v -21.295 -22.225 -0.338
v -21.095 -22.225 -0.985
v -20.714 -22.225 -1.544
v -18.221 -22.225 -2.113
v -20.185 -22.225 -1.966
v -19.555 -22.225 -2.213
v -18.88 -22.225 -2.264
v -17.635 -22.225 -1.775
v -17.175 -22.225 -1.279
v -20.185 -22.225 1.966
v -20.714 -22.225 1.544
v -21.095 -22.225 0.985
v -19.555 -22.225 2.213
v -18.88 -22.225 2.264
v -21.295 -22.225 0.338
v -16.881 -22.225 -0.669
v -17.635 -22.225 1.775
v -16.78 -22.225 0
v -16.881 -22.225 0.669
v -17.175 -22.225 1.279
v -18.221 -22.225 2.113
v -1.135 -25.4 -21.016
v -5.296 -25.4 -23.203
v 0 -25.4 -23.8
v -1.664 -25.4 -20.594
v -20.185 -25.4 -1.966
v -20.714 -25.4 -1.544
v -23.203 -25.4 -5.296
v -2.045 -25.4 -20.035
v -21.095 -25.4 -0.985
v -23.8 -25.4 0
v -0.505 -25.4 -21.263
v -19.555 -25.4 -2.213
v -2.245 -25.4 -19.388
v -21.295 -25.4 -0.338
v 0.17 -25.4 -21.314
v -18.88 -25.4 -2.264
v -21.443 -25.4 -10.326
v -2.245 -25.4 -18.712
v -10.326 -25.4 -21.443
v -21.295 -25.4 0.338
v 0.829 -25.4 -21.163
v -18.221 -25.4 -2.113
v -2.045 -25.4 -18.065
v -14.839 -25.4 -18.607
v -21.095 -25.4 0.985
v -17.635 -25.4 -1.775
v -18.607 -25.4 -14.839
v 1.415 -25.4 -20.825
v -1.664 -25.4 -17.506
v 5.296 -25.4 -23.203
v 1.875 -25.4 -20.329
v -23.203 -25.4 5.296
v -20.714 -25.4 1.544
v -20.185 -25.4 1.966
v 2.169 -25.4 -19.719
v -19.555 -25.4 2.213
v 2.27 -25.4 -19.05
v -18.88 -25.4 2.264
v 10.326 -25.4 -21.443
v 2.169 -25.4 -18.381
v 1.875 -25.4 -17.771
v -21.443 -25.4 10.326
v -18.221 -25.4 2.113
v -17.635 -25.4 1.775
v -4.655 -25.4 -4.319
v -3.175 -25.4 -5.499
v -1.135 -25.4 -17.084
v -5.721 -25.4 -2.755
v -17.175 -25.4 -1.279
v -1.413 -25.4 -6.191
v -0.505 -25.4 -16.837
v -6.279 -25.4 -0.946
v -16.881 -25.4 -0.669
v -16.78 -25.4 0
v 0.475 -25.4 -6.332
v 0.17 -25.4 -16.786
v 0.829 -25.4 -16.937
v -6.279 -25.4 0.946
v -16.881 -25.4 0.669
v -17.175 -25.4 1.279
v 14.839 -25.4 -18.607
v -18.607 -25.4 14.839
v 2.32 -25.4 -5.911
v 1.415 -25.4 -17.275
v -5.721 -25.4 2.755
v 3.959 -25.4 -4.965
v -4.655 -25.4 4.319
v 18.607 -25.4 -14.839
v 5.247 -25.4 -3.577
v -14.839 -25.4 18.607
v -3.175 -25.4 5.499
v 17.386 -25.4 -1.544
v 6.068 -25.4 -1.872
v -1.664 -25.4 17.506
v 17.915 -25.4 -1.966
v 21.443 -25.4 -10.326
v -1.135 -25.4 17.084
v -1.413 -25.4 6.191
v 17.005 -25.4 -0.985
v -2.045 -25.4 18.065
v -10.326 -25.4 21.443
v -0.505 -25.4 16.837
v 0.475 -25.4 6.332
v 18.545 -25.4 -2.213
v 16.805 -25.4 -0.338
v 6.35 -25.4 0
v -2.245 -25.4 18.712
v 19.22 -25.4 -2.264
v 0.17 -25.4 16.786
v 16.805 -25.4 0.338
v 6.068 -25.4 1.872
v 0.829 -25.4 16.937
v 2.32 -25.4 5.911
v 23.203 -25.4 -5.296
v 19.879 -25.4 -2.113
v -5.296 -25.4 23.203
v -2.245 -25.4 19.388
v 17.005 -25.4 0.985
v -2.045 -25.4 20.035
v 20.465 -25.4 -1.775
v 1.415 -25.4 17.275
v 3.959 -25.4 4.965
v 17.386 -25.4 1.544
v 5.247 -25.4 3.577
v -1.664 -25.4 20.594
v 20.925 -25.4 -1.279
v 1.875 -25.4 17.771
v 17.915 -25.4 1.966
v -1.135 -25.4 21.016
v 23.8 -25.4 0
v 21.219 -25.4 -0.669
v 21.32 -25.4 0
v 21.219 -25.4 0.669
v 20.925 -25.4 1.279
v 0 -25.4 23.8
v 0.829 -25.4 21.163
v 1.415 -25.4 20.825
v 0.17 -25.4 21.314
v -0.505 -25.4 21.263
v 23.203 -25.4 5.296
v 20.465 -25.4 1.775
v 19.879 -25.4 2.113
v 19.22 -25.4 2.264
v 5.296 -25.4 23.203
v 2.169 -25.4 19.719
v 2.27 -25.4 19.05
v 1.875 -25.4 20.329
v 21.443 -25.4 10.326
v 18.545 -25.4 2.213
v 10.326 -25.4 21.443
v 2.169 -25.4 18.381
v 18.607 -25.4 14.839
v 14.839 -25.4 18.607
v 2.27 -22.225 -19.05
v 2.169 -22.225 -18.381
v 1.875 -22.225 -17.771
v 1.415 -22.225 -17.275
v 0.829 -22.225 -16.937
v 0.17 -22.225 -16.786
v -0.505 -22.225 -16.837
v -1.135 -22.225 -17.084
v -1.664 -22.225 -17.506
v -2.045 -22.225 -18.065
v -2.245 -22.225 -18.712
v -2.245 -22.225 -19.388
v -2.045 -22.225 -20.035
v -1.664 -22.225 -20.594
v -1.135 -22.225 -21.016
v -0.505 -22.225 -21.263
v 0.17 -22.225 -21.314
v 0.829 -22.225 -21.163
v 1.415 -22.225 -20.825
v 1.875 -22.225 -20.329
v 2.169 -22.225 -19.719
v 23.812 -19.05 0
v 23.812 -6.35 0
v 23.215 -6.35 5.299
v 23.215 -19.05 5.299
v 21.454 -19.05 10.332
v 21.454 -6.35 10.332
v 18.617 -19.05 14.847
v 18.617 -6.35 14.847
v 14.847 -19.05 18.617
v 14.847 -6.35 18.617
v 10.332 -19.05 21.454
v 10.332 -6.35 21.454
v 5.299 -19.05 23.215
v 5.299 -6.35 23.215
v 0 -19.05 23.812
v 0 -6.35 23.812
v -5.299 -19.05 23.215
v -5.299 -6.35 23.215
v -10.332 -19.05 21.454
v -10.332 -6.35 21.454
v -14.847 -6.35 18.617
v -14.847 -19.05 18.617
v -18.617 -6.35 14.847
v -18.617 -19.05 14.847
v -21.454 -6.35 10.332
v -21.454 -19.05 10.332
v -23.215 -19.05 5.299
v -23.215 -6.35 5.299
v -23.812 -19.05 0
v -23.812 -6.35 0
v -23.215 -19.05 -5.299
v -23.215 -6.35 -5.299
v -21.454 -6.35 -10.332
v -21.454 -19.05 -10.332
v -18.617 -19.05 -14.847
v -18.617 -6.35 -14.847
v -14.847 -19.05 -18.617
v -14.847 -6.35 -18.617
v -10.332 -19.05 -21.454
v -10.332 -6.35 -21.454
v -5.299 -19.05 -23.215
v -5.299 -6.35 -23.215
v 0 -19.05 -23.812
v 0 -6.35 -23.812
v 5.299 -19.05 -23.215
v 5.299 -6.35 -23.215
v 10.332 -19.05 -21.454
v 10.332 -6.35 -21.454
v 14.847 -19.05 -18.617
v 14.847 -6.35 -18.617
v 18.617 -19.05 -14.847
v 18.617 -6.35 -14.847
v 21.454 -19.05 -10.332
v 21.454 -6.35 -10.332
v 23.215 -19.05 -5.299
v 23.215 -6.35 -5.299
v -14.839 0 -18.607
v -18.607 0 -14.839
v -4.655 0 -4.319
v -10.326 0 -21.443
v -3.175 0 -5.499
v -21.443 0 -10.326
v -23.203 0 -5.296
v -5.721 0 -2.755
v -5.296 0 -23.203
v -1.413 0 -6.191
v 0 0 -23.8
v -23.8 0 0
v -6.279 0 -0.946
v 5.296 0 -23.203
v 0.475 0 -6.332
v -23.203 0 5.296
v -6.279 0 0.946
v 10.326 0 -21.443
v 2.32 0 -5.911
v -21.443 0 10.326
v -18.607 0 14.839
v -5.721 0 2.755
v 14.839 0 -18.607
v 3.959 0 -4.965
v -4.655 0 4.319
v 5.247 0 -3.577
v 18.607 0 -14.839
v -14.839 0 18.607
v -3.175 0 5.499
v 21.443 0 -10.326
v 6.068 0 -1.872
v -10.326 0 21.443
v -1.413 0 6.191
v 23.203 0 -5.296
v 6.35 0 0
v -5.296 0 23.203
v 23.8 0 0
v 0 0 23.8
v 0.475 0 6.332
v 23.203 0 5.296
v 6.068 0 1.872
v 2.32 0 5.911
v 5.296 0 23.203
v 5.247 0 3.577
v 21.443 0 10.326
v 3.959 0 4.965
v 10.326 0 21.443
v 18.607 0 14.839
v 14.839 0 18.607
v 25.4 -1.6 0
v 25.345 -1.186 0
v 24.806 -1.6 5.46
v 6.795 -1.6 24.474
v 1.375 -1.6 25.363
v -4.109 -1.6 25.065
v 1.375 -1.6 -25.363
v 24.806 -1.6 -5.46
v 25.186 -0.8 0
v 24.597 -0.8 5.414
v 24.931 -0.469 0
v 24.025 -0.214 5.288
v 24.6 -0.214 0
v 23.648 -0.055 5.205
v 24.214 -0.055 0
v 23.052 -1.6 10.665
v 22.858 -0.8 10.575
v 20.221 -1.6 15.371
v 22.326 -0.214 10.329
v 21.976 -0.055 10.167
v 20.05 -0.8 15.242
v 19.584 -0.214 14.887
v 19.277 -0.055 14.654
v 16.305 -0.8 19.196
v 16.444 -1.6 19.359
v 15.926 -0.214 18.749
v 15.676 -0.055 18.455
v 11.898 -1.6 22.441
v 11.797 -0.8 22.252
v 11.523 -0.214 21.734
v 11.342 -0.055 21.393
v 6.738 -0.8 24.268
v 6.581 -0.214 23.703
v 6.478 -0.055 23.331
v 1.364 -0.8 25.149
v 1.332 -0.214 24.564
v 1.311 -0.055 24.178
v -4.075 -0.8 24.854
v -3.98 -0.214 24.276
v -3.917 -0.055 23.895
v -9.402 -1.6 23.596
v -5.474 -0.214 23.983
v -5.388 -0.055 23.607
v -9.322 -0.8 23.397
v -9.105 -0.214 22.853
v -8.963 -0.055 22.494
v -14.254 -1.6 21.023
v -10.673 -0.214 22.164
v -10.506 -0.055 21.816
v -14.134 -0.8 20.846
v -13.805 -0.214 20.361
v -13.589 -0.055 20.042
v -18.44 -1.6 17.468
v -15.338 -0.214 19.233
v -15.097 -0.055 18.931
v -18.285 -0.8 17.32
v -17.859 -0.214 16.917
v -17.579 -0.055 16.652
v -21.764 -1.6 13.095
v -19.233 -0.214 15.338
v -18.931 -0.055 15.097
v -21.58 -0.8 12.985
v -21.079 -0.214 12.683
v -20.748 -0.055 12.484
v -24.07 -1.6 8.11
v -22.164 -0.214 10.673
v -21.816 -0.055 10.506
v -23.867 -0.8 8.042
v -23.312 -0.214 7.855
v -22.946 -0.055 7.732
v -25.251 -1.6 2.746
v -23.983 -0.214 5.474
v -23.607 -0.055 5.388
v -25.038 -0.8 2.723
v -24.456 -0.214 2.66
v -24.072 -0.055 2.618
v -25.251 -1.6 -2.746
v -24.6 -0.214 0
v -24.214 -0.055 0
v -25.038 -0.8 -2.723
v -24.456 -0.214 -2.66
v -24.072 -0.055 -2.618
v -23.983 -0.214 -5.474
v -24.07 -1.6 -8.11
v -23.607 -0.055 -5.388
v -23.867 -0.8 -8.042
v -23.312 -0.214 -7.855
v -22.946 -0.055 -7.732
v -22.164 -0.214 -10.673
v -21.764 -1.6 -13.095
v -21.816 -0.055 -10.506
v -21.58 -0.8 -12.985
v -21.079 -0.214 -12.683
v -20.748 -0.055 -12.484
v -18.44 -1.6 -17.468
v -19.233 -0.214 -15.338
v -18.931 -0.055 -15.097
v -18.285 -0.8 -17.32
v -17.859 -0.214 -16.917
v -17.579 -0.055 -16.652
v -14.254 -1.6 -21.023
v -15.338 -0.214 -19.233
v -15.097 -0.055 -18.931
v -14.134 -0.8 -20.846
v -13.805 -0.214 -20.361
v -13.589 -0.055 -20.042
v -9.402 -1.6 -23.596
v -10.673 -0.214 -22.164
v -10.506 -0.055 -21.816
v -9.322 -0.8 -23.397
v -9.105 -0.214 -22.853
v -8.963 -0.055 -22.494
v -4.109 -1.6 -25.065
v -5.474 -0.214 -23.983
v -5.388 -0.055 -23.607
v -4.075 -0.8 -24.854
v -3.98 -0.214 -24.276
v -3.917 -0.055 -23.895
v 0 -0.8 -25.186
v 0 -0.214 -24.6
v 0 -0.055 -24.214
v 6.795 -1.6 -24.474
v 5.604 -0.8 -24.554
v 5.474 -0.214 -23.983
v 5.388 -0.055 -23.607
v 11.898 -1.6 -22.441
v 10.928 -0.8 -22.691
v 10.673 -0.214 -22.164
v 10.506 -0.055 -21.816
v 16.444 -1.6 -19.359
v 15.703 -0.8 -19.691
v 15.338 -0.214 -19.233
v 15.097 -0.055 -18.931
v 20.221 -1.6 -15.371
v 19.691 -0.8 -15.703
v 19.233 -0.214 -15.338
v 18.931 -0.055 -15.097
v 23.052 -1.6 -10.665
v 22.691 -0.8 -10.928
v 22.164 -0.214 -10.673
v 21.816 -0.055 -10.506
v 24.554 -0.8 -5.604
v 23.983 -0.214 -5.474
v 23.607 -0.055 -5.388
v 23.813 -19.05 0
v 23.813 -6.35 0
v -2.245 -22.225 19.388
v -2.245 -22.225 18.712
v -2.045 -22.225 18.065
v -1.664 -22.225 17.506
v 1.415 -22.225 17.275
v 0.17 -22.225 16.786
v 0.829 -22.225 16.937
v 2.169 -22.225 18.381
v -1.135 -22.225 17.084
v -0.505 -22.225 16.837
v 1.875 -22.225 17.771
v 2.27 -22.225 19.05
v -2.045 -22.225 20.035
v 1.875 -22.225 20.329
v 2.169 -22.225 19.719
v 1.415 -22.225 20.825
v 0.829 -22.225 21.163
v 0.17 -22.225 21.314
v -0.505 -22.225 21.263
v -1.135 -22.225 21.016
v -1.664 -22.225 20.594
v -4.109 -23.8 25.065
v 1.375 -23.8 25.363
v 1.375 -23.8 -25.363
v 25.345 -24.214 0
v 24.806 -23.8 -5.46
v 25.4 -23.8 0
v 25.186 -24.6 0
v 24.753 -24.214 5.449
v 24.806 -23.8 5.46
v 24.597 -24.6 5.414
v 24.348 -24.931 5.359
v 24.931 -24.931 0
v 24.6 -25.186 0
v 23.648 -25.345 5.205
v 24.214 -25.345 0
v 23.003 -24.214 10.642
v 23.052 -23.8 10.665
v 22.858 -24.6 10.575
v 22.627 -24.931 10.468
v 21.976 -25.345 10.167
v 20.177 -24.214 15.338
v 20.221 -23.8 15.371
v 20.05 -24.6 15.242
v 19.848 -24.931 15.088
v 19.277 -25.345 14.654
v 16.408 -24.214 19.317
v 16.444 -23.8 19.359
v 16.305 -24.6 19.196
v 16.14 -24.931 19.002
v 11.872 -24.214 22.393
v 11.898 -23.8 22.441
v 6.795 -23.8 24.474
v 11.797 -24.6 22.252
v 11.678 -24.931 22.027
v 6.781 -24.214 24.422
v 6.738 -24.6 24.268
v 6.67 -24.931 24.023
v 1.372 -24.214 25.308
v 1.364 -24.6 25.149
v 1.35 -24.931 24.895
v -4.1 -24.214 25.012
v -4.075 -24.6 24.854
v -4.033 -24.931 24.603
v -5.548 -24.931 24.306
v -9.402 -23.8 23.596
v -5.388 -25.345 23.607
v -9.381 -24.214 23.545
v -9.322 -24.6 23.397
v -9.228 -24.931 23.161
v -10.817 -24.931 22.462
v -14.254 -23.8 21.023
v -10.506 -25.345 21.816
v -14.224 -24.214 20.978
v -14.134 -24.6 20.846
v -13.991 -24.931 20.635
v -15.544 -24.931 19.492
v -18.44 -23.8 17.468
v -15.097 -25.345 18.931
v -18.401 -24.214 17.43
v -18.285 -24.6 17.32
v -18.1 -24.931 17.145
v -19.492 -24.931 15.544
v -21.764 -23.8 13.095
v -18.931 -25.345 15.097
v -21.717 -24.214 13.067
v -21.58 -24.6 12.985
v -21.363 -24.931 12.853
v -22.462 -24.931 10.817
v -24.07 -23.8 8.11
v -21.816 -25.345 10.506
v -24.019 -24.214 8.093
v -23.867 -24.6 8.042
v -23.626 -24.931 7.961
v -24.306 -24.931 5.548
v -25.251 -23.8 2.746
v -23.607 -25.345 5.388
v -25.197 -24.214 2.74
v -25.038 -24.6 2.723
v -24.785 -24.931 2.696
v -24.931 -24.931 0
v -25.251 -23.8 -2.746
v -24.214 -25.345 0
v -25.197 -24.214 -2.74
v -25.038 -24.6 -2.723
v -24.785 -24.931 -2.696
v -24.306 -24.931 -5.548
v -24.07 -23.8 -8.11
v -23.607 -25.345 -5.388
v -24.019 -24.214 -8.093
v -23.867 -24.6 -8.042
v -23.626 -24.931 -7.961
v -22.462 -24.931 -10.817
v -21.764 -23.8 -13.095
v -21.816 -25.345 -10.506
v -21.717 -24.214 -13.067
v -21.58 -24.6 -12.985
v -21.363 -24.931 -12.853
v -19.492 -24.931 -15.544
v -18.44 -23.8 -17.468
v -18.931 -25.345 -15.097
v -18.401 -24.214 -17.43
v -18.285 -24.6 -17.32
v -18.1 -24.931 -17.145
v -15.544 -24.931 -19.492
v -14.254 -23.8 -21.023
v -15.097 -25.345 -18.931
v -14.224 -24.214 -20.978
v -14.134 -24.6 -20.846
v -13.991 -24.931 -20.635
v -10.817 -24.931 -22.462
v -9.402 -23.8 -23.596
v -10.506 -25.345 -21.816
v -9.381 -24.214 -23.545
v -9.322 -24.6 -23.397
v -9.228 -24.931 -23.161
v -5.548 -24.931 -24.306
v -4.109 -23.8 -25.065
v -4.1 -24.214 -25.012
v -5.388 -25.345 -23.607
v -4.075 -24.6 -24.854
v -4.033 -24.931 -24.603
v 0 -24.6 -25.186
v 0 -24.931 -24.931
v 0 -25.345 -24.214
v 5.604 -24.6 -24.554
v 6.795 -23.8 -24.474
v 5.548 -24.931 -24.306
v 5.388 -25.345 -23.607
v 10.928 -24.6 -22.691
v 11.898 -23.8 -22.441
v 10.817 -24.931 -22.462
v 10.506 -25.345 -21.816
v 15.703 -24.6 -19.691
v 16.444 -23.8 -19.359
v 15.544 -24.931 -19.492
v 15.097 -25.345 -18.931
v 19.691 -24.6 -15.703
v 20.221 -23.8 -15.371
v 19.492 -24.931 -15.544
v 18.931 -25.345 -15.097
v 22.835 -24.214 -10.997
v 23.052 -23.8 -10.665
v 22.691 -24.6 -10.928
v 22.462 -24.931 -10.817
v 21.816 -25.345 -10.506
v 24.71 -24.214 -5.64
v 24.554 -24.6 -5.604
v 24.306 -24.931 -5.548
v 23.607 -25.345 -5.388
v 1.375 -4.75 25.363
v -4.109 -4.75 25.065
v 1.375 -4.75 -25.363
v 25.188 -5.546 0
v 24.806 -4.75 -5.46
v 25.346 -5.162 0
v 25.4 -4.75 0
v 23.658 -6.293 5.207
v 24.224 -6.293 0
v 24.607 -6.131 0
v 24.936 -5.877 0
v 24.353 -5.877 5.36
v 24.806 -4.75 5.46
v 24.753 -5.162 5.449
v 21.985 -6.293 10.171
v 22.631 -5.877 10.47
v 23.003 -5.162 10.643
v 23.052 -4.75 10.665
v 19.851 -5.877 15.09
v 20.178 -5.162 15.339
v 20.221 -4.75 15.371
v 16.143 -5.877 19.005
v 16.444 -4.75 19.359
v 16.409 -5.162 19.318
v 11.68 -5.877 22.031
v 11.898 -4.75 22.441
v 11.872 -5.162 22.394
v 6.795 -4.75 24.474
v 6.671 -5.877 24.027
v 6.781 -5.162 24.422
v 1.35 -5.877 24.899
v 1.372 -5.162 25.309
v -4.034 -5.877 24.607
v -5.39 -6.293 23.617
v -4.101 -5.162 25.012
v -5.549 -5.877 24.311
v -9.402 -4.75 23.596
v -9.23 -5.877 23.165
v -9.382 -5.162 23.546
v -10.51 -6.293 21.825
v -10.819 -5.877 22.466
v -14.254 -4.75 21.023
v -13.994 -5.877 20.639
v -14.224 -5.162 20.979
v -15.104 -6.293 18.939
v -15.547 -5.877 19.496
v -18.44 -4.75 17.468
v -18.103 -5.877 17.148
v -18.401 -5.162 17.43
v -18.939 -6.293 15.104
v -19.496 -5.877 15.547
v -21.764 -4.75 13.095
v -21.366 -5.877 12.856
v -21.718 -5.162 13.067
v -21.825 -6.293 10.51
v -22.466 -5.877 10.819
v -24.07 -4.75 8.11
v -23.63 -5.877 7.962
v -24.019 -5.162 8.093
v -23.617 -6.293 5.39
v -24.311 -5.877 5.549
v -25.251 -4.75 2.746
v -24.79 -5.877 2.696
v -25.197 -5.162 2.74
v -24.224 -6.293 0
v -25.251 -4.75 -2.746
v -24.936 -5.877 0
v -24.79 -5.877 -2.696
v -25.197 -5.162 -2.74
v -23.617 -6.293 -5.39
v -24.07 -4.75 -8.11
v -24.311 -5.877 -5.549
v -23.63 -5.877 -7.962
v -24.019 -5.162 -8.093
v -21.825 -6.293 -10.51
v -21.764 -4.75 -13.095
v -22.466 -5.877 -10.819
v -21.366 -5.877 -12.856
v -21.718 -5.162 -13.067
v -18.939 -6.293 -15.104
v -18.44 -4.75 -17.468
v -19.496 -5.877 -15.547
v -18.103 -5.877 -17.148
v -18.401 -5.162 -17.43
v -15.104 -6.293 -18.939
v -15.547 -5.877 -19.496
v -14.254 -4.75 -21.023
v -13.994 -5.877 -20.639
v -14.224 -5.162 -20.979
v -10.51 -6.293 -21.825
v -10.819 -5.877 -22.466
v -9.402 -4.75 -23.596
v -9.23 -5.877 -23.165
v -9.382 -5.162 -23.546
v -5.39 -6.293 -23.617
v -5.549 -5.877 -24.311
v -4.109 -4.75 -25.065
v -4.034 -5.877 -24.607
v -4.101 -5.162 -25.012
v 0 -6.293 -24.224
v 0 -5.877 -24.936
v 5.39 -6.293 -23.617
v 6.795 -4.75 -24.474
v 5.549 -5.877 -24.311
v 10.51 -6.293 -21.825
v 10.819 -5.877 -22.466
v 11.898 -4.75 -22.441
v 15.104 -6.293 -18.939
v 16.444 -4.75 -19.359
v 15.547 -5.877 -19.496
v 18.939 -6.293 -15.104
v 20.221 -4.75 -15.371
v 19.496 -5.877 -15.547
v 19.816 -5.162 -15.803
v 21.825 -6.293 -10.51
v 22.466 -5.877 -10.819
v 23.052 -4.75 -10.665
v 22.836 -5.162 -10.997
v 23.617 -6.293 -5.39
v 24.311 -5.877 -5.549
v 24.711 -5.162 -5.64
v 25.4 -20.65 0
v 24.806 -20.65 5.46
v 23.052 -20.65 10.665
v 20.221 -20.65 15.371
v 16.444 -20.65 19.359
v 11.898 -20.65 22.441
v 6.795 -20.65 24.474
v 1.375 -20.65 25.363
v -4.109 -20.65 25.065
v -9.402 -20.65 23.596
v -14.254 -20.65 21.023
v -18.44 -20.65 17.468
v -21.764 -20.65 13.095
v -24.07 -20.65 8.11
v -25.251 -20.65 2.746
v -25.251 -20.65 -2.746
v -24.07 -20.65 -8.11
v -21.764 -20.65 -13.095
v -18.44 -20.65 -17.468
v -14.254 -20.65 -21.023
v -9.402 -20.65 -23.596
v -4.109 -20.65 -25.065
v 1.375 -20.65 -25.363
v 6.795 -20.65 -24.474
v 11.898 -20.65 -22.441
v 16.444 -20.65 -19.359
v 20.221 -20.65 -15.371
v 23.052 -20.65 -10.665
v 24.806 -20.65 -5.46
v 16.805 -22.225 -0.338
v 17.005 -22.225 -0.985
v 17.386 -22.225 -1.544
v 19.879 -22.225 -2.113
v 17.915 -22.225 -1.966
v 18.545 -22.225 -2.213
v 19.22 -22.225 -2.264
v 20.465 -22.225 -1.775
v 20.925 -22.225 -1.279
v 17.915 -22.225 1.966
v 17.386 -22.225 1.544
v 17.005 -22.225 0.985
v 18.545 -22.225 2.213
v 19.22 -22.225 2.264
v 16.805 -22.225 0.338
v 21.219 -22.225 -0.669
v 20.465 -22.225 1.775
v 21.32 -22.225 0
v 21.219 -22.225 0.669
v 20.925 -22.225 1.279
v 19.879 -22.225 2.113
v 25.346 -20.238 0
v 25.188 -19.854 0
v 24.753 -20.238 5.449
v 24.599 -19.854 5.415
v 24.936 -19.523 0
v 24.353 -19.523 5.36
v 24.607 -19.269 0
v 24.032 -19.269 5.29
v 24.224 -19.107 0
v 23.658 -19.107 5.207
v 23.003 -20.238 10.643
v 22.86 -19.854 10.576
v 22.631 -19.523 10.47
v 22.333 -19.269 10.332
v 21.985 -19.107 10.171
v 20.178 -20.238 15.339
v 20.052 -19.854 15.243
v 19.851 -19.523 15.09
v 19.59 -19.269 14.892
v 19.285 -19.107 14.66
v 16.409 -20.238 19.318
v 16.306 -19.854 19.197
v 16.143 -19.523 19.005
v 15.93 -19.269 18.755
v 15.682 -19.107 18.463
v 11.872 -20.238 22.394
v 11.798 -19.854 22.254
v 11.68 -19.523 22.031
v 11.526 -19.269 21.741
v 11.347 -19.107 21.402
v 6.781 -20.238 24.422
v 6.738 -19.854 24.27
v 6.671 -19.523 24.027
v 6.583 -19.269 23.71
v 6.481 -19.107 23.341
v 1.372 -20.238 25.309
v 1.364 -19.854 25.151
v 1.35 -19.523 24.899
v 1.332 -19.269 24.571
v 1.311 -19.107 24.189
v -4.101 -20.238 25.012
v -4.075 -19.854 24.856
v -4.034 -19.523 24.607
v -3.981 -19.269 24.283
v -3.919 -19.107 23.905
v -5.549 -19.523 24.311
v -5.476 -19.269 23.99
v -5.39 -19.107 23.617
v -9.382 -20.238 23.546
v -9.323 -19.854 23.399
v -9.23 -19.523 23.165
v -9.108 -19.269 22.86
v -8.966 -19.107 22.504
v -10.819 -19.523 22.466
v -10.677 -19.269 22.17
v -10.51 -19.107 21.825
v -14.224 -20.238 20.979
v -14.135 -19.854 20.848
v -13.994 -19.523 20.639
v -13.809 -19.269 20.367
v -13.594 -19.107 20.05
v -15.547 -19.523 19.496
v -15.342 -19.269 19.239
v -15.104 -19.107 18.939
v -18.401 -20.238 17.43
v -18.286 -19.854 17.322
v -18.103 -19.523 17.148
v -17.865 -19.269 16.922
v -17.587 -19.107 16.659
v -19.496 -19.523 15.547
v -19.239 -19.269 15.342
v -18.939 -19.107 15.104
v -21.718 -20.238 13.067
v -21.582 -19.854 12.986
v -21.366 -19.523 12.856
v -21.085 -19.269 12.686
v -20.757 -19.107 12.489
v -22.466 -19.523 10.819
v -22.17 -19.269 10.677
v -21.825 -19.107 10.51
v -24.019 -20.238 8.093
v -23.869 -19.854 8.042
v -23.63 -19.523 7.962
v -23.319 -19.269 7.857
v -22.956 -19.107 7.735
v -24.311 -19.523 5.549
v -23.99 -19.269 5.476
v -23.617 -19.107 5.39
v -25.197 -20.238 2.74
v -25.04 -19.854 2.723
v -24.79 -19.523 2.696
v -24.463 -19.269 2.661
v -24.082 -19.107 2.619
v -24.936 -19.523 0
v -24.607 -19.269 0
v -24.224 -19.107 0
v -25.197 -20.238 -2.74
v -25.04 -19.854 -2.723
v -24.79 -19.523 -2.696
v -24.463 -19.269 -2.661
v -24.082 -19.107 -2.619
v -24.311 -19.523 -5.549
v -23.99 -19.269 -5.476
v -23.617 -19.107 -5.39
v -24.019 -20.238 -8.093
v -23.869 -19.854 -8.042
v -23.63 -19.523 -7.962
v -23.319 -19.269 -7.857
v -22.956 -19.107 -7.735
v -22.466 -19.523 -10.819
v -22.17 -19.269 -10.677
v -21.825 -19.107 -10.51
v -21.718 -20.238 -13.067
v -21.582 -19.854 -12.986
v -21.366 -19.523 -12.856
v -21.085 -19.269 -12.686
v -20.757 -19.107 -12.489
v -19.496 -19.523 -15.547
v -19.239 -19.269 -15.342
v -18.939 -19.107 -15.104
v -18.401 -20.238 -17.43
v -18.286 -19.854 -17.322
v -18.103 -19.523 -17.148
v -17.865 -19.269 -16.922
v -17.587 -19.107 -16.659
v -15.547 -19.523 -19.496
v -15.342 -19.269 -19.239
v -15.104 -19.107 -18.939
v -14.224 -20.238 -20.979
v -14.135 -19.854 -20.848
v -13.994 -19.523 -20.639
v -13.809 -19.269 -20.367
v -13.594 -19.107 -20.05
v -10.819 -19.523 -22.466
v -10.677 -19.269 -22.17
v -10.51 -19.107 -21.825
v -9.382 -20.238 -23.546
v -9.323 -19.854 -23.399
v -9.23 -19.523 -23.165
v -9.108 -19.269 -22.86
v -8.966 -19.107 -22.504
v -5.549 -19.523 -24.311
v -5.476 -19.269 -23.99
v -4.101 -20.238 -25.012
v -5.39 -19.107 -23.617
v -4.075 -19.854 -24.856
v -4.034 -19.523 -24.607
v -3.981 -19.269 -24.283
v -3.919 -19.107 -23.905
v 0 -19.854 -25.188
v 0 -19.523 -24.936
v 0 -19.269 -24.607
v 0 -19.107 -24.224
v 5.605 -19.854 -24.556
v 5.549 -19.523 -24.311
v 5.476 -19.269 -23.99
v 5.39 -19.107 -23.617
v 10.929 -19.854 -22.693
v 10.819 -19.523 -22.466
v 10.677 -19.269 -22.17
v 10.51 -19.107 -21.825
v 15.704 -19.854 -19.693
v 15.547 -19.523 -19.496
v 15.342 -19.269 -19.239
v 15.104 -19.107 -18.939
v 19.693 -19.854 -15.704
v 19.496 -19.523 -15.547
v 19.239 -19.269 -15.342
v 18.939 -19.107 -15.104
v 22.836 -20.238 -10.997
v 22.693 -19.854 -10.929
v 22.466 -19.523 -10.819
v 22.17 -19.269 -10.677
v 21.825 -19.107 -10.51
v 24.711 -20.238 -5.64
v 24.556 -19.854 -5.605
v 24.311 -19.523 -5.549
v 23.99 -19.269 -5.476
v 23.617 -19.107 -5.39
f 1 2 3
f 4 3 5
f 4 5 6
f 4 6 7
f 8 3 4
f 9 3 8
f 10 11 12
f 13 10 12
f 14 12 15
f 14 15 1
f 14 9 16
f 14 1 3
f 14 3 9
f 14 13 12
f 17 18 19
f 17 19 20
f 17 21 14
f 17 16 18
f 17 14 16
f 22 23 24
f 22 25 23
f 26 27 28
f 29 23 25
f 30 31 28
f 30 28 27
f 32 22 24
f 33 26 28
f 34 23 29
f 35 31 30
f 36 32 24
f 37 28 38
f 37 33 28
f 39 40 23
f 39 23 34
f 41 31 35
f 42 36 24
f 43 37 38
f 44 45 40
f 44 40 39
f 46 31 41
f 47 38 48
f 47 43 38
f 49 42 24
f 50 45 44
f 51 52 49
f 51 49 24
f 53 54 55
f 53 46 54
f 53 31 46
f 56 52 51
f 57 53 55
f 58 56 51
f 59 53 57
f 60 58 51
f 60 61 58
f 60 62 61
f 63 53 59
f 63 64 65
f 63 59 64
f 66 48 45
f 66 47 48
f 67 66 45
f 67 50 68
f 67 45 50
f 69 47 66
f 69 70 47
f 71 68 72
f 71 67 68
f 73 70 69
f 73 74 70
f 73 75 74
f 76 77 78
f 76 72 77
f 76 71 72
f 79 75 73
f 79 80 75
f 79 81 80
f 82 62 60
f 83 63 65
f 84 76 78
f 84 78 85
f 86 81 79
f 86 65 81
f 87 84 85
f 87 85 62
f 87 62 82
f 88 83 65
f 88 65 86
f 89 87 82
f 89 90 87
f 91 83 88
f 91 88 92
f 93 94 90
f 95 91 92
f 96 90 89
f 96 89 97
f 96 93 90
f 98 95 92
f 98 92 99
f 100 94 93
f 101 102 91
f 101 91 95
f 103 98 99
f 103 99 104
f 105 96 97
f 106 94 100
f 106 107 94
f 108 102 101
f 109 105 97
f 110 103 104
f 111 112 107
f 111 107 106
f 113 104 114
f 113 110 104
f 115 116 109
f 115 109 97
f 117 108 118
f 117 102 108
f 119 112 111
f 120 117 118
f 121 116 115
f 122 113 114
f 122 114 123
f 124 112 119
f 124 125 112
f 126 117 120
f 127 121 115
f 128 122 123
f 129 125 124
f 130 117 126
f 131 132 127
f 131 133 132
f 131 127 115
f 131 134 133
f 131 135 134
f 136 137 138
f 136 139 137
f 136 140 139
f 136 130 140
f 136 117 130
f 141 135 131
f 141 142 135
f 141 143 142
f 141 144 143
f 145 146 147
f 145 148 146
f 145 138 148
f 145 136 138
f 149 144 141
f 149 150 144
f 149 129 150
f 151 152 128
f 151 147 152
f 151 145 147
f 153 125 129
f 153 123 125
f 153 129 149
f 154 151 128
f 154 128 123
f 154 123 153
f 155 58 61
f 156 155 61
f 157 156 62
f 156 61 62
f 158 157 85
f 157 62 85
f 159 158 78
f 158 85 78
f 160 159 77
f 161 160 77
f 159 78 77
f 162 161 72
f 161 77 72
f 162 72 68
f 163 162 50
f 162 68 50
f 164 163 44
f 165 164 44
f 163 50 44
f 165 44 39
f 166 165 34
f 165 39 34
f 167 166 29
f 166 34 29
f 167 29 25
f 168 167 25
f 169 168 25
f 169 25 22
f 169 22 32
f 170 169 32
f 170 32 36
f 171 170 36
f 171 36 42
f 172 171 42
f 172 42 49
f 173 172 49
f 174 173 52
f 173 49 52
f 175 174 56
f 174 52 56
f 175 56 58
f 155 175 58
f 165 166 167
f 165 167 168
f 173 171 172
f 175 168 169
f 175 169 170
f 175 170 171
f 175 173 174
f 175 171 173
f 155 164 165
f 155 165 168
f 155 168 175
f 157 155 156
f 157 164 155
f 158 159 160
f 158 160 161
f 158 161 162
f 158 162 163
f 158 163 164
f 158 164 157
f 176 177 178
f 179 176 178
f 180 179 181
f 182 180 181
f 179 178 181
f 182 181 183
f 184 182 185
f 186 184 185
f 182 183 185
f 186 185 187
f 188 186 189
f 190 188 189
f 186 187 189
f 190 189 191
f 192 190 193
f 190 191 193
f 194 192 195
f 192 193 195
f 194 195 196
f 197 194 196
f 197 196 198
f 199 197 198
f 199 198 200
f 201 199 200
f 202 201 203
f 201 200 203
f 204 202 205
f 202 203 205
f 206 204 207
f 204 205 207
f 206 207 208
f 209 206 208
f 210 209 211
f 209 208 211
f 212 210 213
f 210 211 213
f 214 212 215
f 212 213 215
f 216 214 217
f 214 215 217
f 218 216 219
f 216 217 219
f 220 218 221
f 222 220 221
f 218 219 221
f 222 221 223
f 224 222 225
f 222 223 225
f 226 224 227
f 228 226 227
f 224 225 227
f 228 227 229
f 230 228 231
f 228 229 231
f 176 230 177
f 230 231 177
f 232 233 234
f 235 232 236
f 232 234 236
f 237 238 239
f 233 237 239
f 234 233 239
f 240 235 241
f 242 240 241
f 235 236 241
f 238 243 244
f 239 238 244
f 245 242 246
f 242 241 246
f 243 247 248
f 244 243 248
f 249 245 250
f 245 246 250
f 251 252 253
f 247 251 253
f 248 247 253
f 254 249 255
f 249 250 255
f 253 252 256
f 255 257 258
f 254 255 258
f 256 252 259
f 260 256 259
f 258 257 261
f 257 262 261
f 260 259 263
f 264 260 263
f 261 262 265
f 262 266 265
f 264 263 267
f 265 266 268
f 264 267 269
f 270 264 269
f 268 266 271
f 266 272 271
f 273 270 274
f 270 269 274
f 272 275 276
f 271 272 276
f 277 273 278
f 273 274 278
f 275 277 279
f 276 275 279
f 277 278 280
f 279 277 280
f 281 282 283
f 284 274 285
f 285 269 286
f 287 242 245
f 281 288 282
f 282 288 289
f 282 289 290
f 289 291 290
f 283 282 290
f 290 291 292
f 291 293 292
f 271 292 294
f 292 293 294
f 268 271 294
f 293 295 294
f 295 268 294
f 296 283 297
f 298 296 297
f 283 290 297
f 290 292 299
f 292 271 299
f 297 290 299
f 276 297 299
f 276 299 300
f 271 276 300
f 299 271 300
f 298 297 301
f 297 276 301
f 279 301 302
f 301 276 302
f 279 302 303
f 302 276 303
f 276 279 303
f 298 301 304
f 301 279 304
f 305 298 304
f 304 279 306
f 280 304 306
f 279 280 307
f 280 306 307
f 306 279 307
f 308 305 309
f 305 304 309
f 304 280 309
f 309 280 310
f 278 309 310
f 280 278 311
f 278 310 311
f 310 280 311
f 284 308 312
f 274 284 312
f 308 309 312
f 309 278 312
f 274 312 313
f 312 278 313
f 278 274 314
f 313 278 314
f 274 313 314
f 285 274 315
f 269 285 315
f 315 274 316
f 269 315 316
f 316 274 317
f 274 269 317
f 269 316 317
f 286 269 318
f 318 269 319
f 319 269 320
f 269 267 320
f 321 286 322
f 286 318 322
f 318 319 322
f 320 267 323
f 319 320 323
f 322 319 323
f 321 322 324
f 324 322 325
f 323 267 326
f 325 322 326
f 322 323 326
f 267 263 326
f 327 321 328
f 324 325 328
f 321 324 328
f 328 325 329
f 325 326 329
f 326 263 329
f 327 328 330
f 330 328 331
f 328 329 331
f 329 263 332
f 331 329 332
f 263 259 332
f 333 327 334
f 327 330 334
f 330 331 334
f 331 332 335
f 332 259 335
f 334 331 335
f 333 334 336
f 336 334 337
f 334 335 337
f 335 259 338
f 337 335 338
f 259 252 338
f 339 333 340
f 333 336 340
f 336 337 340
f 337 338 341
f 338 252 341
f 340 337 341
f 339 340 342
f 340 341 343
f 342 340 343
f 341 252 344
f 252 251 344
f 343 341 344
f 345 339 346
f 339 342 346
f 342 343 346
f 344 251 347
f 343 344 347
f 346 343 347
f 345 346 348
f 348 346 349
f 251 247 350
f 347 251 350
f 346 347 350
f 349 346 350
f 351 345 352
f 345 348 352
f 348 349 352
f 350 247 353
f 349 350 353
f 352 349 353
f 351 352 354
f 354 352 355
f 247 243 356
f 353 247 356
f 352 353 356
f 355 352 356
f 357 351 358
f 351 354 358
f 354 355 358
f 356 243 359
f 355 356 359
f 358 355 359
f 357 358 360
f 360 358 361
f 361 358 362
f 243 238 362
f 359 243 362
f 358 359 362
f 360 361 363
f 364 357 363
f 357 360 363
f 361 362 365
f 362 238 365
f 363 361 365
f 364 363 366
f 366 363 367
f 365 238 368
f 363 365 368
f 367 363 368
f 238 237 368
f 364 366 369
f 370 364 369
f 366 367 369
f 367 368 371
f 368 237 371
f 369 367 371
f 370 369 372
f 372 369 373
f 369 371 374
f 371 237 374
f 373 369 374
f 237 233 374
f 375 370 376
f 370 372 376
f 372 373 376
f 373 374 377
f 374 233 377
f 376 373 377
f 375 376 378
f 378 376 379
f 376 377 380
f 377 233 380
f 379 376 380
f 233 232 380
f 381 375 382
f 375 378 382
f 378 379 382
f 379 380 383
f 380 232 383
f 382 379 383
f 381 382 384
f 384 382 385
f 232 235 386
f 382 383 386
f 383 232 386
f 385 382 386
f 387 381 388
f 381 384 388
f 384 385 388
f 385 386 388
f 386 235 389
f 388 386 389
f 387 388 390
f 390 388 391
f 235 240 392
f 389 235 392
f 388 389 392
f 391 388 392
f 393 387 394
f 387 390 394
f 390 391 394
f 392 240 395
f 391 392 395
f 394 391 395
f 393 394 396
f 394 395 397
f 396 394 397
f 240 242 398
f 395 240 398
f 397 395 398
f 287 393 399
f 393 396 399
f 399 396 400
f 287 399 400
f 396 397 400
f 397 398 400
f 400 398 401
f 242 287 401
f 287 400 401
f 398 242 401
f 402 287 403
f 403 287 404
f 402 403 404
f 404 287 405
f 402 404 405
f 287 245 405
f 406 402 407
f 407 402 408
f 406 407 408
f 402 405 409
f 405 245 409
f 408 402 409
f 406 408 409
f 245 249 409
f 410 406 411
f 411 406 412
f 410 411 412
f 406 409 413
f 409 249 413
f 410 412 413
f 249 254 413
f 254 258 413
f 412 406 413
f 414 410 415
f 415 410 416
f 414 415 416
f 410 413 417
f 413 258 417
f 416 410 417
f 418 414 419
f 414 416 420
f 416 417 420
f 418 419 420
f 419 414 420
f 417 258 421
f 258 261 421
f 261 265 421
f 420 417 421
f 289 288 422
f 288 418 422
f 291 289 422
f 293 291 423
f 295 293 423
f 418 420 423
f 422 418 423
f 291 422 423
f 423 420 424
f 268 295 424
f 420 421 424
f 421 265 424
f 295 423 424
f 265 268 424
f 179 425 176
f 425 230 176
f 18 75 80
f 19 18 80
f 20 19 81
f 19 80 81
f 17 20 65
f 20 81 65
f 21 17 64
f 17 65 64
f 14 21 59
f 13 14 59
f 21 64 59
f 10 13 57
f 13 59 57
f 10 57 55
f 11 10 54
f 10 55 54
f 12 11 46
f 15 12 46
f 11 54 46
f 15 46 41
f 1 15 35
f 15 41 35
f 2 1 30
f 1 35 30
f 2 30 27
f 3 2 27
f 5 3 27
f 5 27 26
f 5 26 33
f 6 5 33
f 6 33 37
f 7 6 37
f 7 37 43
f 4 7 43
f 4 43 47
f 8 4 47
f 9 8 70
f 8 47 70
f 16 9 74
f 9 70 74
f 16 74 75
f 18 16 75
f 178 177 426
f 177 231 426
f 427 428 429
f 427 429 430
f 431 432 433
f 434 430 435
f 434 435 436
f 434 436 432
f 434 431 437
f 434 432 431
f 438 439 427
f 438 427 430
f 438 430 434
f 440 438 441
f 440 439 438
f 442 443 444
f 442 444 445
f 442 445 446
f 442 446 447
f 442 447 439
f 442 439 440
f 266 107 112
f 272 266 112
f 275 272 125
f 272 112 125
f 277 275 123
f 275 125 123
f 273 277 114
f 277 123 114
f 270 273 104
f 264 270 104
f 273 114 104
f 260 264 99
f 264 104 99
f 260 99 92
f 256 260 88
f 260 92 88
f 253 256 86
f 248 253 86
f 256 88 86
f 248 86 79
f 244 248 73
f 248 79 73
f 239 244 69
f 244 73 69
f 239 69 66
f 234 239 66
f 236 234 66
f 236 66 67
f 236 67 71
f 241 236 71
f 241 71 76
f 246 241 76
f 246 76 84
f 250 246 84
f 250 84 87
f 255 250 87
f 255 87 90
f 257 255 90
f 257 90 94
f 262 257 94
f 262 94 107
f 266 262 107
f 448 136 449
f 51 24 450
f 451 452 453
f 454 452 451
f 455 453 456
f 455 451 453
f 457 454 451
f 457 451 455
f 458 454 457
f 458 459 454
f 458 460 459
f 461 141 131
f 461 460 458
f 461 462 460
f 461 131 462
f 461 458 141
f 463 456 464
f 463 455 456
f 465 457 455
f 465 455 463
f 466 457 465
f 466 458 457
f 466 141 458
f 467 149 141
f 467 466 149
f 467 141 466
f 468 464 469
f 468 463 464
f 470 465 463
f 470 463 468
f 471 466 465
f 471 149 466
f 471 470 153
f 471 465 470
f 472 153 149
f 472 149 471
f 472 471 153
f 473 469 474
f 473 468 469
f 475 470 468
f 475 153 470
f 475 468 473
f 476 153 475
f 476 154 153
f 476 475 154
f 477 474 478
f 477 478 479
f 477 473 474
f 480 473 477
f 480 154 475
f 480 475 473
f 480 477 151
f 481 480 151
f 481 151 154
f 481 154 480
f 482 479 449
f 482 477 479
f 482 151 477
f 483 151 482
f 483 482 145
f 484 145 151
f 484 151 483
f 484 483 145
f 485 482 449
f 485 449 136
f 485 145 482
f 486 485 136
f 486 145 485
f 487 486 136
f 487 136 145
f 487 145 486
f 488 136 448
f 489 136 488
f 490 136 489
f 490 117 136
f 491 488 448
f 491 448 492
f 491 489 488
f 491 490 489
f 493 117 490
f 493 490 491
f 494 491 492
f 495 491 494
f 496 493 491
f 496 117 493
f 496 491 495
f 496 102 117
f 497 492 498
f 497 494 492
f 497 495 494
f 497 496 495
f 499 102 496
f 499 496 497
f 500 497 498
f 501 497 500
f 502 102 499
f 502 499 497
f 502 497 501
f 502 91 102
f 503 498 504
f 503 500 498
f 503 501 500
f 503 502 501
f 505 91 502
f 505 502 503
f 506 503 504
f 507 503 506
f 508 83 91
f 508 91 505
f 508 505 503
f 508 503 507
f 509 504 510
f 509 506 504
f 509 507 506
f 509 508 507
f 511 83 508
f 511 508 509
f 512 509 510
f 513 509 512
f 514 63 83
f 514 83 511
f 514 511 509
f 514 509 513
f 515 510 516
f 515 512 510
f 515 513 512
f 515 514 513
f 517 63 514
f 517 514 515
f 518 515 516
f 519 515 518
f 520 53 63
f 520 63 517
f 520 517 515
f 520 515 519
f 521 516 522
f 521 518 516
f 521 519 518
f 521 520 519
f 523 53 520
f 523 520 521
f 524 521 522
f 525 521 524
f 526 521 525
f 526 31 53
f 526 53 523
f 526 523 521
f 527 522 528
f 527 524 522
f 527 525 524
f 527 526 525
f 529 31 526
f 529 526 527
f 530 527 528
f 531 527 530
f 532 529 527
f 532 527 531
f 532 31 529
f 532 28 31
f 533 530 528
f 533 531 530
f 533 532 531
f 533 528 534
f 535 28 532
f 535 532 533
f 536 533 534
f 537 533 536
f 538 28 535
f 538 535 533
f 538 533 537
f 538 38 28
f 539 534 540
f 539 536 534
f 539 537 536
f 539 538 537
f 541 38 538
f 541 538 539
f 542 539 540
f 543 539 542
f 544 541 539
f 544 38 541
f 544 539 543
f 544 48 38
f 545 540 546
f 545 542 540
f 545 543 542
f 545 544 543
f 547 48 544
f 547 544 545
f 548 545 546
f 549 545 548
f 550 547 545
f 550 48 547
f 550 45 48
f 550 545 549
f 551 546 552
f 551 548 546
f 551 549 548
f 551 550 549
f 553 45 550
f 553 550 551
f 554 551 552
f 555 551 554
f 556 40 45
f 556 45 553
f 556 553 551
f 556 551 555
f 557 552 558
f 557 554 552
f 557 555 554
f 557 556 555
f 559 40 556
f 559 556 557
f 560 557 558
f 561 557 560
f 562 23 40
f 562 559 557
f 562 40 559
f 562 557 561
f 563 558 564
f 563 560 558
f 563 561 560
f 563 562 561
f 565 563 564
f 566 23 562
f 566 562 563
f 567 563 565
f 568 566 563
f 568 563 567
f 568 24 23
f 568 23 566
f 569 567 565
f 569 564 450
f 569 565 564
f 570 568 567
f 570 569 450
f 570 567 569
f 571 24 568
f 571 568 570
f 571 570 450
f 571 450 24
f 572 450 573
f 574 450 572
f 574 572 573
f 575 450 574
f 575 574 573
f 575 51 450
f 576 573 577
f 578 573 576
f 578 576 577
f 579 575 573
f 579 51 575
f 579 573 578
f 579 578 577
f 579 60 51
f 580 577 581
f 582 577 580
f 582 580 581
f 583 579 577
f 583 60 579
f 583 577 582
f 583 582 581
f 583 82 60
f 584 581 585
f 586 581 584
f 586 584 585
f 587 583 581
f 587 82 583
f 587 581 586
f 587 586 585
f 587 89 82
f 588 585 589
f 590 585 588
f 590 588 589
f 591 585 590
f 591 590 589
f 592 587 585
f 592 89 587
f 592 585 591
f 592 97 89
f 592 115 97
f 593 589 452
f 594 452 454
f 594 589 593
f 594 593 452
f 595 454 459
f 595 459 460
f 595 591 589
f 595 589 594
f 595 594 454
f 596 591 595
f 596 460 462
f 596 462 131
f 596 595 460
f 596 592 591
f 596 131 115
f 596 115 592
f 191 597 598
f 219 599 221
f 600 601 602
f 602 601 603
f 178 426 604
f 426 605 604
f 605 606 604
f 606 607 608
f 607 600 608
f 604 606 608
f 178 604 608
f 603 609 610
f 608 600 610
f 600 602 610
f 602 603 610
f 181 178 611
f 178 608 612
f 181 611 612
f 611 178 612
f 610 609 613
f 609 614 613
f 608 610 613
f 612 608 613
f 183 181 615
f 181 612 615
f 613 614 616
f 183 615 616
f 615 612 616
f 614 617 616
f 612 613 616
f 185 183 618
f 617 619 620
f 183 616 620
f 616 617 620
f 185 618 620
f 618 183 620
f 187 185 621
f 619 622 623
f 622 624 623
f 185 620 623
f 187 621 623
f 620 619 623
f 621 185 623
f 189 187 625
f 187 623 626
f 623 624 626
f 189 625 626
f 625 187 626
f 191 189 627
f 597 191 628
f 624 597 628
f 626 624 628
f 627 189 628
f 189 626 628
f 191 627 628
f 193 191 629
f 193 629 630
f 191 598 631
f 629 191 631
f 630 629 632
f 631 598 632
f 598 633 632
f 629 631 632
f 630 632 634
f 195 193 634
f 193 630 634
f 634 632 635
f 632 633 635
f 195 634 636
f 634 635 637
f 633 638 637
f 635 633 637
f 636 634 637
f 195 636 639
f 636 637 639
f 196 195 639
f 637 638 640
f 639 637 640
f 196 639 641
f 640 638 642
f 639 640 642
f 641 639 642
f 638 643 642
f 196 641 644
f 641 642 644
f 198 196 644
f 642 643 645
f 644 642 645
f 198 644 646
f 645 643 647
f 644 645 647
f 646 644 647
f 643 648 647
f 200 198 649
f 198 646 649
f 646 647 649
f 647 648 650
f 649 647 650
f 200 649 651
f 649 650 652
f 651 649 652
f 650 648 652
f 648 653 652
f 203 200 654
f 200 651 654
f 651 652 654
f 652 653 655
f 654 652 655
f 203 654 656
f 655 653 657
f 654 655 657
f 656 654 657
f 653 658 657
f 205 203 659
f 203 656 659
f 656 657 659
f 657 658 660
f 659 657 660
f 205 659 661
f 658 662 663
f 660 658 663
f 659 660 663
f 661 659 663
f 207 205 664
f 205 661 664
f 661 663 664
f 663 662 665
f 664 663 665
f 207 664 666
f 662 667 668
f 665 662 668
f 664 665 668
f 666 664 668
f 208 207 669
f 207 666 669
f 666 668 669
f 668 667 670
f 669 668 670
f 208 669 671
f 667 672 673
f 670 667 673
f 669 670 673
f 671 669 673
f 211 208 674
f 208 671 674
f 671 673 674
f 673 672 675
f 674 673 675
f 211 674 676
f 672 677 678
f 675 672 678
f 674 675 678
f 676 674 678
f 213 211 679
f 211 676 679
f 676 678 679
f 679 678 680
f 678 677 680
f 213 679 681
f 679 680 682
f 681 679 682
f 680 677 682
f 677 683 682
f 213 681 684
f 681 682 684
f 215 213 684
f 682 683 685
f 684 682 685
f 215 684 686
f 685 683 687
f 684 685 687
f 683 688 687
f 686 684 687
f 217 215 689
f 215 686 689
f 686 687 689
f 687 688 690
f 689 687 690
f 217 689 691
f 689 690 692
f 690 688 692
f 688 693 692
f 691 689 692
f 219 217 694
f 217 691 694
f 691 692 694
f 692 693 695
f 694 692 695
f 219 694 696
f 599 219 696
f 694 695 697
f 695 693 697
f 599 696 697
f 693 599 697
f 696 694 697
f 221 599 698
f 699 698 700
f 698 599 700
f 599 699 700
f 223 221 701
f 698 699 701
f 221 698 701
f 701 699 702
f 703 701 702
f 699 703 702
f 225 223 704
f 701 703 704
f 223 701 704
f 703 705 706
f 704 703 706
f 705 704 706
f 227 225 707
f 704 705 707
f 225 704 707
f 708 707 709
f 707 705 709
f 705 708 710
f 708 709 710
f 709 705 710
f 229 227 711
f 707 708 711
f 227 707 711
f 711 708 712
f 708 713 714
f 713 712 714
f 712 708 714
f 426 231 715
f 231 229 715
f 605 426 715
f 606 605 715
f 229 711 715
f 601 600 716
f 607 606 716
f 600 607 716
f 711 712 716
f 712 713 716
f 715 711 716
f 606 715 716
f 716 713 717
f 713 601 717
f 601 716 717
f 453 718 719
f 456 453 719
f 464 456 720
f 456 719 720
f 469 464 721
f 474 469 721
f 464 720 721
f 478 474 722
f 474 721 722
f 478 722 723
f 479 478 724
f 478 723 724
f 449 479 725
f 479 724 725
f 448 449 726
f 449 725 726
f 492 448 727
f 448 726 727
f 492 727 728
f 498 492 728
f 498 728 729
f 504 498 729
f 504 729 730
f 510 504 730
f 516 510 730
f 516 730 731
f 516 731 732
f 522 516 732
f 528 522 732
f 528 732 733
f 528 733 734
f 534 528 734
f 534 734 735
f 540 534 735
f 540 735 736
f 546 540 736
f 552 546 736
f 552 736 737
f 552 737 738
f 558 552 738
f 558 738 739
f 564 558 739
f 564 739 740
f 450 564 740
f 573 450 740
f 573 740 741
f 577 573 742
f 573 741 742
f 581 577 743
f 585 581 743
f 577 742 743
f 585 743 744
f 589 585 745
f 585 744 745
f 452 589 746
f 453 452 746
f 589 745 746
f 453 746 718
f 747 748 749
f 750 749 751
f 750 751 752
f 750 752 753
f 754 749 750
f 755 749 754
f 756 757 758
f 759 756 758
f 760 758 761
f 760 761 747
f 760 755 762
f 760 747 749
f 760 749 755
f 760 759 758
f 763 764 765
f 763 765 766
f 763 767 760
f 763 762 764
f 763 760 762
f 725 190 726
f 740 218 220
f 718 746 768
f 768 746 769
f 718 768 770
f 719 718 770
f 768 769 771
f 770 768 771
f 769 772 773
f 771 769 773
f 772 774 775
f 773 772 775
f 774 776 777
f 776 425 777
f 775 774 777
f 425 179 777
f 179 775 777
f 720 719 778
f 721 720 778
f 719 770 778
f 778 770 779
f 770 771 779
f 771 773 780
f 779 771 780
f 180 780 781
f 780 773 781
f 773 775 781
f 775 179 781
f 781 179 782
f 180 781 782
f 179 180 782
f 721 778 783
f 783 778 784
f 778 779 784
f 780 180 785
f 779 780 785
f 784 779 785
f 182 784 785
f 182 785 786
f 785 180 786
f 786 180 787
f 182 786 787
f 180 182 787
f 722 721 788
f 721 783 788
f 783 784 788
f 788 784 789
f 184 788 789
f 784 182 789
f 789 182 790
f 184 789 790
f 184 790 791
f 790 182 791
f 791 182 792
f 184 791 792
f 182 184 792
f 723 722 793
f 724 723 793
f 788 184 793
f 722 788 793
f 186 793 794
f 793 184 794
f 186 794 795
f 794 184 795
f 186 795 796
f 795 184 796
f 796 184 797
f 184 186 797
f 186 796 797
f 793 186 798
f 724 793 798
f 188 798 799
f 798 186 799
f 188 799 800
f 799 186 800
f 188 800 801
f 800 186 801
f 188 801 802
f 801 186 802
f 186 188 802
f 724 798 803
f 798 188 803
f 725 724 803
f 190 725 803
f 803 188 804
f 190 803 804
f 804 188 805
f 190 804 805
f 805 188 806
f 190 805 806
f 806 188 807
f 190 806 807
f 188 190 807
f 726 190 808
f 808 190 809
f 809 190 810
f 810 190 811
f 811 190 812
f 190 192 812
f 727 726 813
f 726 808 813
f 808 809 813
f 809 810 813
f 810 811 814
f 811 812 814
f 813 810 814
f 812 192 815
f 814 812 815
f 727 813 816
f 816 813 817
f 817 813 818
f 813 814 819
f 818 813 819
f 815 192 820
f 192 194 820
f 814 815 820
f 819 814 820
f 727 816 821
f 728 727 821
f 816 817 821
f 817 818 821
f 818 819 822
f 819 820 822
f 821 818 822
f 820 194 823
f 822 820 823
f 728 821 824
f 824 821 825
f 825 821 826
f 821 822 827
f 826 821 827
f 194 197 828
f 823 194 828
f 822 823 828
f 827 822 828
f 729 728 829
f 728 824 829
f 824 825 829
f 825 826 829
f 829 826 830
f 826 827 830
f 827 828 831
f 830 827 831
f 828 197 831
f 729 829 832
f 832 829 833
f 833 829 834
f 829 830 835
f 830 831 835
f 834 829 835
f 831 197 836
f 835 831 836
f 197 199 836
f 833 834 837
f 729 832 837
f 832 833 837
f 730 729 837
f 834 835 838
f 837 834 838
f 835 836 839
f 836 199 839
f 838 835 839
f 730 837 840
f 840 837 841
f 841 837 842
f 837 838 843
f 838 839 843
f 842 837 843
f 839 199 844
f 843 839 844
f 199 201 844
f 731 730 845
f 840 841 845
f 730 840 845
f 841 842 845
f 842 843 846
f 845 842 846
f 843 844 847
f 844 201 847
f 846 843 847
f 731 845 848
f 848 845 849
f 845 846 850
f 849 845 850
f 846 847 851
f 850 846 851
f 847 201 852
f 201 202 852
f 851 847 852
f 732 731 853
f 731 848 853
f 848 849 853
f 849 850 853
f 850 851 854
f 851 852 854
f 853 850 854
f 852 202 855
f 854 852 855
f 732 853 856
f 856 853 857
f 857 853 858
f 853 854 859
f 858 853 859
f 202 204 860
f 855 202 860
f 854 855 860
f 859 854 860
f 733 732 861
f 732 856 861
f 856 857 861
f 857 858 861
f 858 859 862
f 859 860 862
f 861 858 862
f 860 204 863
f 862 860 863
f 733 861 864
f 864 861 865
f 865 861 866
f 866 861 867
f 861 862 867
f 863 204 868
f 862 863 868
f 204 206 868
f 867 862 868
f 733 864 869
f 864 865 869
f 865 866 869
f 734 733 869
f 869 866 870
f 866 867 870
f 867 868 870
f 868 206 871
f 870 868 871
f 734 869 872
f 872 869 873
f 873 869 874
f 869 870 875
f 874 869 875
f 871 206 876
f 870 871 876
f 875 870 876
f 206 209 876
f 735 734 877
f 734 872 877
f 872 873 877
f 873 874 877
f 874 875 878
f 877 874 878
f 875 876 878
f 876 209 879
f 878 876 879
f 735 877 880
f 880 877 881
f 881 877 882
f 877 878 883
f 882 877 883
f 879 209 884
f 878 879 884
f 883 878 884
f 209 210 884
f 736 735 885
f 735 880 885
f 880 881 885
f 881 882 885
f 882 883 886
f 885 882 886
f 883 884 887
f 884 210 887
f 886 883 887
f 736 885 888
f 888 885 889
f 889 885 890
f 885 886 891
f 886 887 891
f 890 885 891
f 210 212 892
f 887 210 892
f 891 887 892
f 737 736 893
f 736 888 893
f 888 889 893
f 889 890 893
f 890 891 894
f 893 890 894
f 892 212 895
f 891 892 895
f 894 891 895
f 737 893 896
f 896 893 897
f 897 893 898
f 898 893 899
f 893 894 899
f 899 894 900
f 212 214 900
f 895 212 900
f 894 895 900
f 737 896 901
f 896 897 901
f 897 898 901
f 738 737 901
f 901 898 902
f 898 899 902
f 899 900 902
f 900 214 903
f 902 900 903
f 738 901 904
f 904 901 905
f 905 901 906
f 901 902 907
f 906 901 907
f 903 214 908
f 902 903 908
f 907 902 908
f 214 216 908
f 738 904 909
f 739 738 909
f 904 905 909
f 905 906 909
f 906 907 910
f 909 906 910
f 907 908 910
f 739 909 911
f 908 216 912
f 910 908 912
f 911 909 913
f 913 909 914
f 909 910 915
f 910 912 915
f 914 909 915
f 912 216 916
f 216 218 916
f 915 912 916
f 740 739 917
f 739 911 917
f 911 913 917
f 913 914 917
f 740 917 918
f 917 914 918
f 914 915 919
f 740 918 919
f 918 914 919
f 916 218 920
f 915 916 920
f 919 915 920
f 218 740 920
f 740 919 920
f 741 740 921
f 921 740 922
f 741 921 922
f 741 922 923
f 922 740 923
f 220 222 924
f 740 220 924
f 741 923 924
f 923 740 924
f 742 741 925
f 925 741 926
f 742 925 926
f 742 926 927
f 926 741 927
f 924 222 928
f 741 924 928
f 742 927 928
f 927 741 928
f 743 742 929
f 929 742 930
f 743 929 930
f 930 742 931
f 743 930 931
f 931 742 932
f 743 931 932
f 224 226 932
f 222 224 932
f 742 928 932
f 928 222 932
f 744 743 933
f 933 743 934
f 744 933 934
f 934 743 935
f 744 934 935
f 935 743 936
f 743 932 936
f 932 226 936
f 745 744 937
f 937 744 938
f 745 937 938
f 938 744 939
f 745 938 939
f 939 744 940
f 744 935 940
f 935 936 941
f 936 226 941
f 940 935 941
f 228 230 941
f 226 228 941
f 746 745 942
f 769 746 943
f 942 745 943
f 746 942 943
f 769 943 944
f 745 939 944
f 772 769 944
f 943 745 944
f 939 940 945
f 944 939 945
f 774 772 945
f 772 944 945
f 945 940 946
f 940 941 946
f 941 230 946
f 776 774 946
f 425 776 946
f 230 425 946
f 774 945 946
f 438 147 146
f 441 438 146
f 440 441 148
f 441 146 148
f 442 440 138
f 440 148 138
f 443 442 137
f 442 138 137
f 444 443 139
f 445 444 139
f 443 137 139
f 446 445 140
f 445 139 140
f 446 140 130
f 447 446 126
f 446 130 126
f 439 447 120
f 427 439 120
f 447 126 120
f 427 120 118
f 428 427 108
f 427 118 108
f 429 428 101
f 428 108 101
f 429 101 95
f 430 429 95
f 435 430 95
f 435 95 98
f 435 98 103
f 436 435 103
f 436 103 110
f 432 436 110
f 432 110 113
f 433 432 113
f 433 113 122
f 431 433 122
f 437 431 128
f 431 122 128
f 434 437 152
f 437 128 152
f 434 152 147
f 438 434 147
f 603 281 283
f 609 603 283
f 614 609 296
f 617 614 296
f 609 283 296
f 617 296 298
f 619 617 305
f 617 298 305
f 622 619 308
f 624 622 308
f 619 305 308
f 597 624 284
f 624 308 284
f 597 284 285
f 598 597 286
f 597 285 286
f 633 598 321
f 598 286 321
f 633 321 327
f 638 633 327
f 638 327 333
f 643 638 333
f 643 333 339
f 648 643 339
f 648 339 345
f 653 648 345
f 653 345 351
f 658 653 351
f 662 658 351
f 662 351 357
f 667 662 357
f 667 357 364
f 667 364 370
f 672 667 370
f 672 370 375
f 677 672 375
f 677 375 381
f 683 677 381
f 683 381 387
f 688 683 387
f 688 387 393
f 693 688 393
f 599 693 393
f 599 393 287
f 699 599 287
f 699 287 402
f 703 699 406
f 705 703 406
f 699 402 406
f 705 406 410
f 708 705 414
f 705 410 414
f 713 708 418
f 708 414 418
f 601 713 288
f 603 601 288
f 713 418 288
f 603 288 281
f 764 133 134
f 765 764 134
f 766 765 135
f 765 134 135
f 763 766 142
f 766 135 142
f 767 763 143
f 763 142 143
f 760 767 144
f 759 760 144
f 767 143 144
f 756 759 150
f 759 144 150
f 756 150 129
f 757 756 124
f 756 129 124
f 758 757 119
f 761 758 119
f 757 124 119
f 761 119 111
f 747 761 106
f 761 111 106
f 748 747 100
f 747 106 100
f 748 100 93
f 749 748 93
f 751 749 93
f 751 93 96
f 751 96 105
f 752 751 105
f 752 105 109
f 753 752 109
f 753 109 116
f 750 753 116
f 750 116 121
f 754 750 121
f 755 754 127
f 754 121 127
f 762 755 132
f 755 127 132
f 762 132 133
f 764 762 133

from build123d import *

# Parameters (mm, degrees)
F0_R         = 25.4
F1_DEPTH     = 6.35
F2_R         = 23.8125
F3_DEPTH     = 12.7
F4_R         = 25.4
F5_DEPTH     = 6.35
F6_S7_R      = 23.8125
F6_T8_DEPTH  = 40
F6_S13_R     = 23.8125
F6_T14_DEPTH = 40
F7_R         = 2.2698789725
F8_DEPTH     = 3.175
F9_R         = 6.35
F10_DEPTH    = 25.401


# Not quite as in the source:
# - a fillet or chamfer that OpenCascade refuses, or shapes differently, is made with other operations: its cross-section is extruded or revolved along the edge and cut away or added


with BuildPart() as f1:
    # F0 (on Front) → F1 (new body)
    with BuildSketch(Plane.XZ):
        Circle(F0_R)
    extrude(amount=F1_DEPTH)

    # F2 (on face) → F3 (join)
    with BuildSketch(Plane.XZ.offset(6.35)):
        Circle(F2_R)
    extrude(amount=F3_DEPTH)

    # F4 (on face) → F5 (join)
    with BuildSketch(Plane.XZ.offset(19.05)):
        Circle(F4_R)
    extrude(amount=F5_DEPTH)

    # F6: fillet of radius 1.6002 on 4 edges, made by hand

    # F6_s1 → F6_t2 (revolve, cut)
    with BuildSketch(Plane.XY):
        with BuildLine():
            ThreePointArc((25.4, -23.7998), (24.9313122713, -24.9313122713), (23.7998, -25.4))
            Line((23.7998, -25.4), (25.4, -25.4))
            Line((25.4, -25.4), (25.4, -23.7998))
        make_face()
    revolve(axis=Axis((0, -25.4, 0), (0, -1, 0)), mode=Mode.SUBTRACT)


with BuildPart() as f6_tool4:
    # F6_s5 → F6_t6 (revolve)
    with BuildSketch(Plane.XY):
        with BuildLine():
            ThreePointArc((25.4, -20.6502), (24.9313122713, -19.5186877287), (23.7998, -19.05))
            Line((23.7998, -19.05), (25.4, -19.05))
            Line((25.4, -19.05), (25.4, -20.6502))
        make_face()
    revolve(axis=Axis((0, -19.05, 0), (0, -1, 0)))

    # F6_s7 → F6_t8 (cut, symmetric)
    with BuildSketch(Plane.XZ.offset(19.9)):
        Circle(F6_S7_R)
    extrude(amount=F6_T8_DEPTH, both=True, mode=Mode.SUBTRACT)


with BuildPart() as f1_1:
    add(f1.part)

    # F6_t3: cut F6_tool4
    add(f6_tool4.part, mode=Mode.SUBTRACT)


with BuildPart() as f6_tool10:
    # F6_s11 → F6_t12 (revolve)
    with BuildSketch(Plane.XY):
        with BuildLine():
            ThreePointArc((23.7998, -6.35), (24.9313122713, -5.8813122713), (25.4, -4.7498))
            Line((25.4, -4.7498), (25.4, -6.35))
            Line((25.4, -6.35), (23.7998, -6.35))
        make_face()
    revolve(axis=Axis((0, -6.35, 0), (0, -1, 0)))

    # F6_s13 → F6_t14 (cut, symmetric)
    with BuildSketch(Plane.XZ.offset(5)):
        Circle(F6_S13_R)
    extrude(amount=F6_T14_DEPTH, both=True, mode=Mode.SUBTRACT)


with BuildPart() as f1_2:
    add(f1_1.part)

    # F6_t9: cut F6_tool10
    add(f6_tool10.part, mode=Mode.SUBTRACT)

    # F6_s15 → F6_t16 (revolve, cut)
    with BuildSketch(Plane.XY):
        with BuildLine():
            ThreePointArc((25.4, -1.6002), (24.9313122713, -0.4686877287), (23.7998, 0))
            Line((23.7998, 0), (25.4, 0))
            Line((25.4, 0), (25.4, -1.6002))
        make_face()
    revolve(axis=Axis((0, 0, 0), (0, -1, 0)), mode=Mode.SUBTRACT)

    # F7 (on face) → F8 (cut)
    with BuildSketch(Plane.XZ.offset(25.4)):
        with Locations((-19.05, 0)):
            Circle(F7_R)
        with Locations((0, -19.05)):
            Circle(F7_R)
        with Locations((19.05, 0)):
            Circle(F7_R)
        with Locations((0, 19.05)):
            Circle(F7_R)
    extrude(amount=-F8_DEPTH, mode=Mode.SUBTRACT)

    # F9 (on face) → F10 (cut, through all)
    with BuildSketch(Plane.XZ.offset(25.4)):
        Circle(F9_R)
    extrude(amount=-F10_DEPTH, mode=Mode.SUBTRACT)


solid = f1_2.part
